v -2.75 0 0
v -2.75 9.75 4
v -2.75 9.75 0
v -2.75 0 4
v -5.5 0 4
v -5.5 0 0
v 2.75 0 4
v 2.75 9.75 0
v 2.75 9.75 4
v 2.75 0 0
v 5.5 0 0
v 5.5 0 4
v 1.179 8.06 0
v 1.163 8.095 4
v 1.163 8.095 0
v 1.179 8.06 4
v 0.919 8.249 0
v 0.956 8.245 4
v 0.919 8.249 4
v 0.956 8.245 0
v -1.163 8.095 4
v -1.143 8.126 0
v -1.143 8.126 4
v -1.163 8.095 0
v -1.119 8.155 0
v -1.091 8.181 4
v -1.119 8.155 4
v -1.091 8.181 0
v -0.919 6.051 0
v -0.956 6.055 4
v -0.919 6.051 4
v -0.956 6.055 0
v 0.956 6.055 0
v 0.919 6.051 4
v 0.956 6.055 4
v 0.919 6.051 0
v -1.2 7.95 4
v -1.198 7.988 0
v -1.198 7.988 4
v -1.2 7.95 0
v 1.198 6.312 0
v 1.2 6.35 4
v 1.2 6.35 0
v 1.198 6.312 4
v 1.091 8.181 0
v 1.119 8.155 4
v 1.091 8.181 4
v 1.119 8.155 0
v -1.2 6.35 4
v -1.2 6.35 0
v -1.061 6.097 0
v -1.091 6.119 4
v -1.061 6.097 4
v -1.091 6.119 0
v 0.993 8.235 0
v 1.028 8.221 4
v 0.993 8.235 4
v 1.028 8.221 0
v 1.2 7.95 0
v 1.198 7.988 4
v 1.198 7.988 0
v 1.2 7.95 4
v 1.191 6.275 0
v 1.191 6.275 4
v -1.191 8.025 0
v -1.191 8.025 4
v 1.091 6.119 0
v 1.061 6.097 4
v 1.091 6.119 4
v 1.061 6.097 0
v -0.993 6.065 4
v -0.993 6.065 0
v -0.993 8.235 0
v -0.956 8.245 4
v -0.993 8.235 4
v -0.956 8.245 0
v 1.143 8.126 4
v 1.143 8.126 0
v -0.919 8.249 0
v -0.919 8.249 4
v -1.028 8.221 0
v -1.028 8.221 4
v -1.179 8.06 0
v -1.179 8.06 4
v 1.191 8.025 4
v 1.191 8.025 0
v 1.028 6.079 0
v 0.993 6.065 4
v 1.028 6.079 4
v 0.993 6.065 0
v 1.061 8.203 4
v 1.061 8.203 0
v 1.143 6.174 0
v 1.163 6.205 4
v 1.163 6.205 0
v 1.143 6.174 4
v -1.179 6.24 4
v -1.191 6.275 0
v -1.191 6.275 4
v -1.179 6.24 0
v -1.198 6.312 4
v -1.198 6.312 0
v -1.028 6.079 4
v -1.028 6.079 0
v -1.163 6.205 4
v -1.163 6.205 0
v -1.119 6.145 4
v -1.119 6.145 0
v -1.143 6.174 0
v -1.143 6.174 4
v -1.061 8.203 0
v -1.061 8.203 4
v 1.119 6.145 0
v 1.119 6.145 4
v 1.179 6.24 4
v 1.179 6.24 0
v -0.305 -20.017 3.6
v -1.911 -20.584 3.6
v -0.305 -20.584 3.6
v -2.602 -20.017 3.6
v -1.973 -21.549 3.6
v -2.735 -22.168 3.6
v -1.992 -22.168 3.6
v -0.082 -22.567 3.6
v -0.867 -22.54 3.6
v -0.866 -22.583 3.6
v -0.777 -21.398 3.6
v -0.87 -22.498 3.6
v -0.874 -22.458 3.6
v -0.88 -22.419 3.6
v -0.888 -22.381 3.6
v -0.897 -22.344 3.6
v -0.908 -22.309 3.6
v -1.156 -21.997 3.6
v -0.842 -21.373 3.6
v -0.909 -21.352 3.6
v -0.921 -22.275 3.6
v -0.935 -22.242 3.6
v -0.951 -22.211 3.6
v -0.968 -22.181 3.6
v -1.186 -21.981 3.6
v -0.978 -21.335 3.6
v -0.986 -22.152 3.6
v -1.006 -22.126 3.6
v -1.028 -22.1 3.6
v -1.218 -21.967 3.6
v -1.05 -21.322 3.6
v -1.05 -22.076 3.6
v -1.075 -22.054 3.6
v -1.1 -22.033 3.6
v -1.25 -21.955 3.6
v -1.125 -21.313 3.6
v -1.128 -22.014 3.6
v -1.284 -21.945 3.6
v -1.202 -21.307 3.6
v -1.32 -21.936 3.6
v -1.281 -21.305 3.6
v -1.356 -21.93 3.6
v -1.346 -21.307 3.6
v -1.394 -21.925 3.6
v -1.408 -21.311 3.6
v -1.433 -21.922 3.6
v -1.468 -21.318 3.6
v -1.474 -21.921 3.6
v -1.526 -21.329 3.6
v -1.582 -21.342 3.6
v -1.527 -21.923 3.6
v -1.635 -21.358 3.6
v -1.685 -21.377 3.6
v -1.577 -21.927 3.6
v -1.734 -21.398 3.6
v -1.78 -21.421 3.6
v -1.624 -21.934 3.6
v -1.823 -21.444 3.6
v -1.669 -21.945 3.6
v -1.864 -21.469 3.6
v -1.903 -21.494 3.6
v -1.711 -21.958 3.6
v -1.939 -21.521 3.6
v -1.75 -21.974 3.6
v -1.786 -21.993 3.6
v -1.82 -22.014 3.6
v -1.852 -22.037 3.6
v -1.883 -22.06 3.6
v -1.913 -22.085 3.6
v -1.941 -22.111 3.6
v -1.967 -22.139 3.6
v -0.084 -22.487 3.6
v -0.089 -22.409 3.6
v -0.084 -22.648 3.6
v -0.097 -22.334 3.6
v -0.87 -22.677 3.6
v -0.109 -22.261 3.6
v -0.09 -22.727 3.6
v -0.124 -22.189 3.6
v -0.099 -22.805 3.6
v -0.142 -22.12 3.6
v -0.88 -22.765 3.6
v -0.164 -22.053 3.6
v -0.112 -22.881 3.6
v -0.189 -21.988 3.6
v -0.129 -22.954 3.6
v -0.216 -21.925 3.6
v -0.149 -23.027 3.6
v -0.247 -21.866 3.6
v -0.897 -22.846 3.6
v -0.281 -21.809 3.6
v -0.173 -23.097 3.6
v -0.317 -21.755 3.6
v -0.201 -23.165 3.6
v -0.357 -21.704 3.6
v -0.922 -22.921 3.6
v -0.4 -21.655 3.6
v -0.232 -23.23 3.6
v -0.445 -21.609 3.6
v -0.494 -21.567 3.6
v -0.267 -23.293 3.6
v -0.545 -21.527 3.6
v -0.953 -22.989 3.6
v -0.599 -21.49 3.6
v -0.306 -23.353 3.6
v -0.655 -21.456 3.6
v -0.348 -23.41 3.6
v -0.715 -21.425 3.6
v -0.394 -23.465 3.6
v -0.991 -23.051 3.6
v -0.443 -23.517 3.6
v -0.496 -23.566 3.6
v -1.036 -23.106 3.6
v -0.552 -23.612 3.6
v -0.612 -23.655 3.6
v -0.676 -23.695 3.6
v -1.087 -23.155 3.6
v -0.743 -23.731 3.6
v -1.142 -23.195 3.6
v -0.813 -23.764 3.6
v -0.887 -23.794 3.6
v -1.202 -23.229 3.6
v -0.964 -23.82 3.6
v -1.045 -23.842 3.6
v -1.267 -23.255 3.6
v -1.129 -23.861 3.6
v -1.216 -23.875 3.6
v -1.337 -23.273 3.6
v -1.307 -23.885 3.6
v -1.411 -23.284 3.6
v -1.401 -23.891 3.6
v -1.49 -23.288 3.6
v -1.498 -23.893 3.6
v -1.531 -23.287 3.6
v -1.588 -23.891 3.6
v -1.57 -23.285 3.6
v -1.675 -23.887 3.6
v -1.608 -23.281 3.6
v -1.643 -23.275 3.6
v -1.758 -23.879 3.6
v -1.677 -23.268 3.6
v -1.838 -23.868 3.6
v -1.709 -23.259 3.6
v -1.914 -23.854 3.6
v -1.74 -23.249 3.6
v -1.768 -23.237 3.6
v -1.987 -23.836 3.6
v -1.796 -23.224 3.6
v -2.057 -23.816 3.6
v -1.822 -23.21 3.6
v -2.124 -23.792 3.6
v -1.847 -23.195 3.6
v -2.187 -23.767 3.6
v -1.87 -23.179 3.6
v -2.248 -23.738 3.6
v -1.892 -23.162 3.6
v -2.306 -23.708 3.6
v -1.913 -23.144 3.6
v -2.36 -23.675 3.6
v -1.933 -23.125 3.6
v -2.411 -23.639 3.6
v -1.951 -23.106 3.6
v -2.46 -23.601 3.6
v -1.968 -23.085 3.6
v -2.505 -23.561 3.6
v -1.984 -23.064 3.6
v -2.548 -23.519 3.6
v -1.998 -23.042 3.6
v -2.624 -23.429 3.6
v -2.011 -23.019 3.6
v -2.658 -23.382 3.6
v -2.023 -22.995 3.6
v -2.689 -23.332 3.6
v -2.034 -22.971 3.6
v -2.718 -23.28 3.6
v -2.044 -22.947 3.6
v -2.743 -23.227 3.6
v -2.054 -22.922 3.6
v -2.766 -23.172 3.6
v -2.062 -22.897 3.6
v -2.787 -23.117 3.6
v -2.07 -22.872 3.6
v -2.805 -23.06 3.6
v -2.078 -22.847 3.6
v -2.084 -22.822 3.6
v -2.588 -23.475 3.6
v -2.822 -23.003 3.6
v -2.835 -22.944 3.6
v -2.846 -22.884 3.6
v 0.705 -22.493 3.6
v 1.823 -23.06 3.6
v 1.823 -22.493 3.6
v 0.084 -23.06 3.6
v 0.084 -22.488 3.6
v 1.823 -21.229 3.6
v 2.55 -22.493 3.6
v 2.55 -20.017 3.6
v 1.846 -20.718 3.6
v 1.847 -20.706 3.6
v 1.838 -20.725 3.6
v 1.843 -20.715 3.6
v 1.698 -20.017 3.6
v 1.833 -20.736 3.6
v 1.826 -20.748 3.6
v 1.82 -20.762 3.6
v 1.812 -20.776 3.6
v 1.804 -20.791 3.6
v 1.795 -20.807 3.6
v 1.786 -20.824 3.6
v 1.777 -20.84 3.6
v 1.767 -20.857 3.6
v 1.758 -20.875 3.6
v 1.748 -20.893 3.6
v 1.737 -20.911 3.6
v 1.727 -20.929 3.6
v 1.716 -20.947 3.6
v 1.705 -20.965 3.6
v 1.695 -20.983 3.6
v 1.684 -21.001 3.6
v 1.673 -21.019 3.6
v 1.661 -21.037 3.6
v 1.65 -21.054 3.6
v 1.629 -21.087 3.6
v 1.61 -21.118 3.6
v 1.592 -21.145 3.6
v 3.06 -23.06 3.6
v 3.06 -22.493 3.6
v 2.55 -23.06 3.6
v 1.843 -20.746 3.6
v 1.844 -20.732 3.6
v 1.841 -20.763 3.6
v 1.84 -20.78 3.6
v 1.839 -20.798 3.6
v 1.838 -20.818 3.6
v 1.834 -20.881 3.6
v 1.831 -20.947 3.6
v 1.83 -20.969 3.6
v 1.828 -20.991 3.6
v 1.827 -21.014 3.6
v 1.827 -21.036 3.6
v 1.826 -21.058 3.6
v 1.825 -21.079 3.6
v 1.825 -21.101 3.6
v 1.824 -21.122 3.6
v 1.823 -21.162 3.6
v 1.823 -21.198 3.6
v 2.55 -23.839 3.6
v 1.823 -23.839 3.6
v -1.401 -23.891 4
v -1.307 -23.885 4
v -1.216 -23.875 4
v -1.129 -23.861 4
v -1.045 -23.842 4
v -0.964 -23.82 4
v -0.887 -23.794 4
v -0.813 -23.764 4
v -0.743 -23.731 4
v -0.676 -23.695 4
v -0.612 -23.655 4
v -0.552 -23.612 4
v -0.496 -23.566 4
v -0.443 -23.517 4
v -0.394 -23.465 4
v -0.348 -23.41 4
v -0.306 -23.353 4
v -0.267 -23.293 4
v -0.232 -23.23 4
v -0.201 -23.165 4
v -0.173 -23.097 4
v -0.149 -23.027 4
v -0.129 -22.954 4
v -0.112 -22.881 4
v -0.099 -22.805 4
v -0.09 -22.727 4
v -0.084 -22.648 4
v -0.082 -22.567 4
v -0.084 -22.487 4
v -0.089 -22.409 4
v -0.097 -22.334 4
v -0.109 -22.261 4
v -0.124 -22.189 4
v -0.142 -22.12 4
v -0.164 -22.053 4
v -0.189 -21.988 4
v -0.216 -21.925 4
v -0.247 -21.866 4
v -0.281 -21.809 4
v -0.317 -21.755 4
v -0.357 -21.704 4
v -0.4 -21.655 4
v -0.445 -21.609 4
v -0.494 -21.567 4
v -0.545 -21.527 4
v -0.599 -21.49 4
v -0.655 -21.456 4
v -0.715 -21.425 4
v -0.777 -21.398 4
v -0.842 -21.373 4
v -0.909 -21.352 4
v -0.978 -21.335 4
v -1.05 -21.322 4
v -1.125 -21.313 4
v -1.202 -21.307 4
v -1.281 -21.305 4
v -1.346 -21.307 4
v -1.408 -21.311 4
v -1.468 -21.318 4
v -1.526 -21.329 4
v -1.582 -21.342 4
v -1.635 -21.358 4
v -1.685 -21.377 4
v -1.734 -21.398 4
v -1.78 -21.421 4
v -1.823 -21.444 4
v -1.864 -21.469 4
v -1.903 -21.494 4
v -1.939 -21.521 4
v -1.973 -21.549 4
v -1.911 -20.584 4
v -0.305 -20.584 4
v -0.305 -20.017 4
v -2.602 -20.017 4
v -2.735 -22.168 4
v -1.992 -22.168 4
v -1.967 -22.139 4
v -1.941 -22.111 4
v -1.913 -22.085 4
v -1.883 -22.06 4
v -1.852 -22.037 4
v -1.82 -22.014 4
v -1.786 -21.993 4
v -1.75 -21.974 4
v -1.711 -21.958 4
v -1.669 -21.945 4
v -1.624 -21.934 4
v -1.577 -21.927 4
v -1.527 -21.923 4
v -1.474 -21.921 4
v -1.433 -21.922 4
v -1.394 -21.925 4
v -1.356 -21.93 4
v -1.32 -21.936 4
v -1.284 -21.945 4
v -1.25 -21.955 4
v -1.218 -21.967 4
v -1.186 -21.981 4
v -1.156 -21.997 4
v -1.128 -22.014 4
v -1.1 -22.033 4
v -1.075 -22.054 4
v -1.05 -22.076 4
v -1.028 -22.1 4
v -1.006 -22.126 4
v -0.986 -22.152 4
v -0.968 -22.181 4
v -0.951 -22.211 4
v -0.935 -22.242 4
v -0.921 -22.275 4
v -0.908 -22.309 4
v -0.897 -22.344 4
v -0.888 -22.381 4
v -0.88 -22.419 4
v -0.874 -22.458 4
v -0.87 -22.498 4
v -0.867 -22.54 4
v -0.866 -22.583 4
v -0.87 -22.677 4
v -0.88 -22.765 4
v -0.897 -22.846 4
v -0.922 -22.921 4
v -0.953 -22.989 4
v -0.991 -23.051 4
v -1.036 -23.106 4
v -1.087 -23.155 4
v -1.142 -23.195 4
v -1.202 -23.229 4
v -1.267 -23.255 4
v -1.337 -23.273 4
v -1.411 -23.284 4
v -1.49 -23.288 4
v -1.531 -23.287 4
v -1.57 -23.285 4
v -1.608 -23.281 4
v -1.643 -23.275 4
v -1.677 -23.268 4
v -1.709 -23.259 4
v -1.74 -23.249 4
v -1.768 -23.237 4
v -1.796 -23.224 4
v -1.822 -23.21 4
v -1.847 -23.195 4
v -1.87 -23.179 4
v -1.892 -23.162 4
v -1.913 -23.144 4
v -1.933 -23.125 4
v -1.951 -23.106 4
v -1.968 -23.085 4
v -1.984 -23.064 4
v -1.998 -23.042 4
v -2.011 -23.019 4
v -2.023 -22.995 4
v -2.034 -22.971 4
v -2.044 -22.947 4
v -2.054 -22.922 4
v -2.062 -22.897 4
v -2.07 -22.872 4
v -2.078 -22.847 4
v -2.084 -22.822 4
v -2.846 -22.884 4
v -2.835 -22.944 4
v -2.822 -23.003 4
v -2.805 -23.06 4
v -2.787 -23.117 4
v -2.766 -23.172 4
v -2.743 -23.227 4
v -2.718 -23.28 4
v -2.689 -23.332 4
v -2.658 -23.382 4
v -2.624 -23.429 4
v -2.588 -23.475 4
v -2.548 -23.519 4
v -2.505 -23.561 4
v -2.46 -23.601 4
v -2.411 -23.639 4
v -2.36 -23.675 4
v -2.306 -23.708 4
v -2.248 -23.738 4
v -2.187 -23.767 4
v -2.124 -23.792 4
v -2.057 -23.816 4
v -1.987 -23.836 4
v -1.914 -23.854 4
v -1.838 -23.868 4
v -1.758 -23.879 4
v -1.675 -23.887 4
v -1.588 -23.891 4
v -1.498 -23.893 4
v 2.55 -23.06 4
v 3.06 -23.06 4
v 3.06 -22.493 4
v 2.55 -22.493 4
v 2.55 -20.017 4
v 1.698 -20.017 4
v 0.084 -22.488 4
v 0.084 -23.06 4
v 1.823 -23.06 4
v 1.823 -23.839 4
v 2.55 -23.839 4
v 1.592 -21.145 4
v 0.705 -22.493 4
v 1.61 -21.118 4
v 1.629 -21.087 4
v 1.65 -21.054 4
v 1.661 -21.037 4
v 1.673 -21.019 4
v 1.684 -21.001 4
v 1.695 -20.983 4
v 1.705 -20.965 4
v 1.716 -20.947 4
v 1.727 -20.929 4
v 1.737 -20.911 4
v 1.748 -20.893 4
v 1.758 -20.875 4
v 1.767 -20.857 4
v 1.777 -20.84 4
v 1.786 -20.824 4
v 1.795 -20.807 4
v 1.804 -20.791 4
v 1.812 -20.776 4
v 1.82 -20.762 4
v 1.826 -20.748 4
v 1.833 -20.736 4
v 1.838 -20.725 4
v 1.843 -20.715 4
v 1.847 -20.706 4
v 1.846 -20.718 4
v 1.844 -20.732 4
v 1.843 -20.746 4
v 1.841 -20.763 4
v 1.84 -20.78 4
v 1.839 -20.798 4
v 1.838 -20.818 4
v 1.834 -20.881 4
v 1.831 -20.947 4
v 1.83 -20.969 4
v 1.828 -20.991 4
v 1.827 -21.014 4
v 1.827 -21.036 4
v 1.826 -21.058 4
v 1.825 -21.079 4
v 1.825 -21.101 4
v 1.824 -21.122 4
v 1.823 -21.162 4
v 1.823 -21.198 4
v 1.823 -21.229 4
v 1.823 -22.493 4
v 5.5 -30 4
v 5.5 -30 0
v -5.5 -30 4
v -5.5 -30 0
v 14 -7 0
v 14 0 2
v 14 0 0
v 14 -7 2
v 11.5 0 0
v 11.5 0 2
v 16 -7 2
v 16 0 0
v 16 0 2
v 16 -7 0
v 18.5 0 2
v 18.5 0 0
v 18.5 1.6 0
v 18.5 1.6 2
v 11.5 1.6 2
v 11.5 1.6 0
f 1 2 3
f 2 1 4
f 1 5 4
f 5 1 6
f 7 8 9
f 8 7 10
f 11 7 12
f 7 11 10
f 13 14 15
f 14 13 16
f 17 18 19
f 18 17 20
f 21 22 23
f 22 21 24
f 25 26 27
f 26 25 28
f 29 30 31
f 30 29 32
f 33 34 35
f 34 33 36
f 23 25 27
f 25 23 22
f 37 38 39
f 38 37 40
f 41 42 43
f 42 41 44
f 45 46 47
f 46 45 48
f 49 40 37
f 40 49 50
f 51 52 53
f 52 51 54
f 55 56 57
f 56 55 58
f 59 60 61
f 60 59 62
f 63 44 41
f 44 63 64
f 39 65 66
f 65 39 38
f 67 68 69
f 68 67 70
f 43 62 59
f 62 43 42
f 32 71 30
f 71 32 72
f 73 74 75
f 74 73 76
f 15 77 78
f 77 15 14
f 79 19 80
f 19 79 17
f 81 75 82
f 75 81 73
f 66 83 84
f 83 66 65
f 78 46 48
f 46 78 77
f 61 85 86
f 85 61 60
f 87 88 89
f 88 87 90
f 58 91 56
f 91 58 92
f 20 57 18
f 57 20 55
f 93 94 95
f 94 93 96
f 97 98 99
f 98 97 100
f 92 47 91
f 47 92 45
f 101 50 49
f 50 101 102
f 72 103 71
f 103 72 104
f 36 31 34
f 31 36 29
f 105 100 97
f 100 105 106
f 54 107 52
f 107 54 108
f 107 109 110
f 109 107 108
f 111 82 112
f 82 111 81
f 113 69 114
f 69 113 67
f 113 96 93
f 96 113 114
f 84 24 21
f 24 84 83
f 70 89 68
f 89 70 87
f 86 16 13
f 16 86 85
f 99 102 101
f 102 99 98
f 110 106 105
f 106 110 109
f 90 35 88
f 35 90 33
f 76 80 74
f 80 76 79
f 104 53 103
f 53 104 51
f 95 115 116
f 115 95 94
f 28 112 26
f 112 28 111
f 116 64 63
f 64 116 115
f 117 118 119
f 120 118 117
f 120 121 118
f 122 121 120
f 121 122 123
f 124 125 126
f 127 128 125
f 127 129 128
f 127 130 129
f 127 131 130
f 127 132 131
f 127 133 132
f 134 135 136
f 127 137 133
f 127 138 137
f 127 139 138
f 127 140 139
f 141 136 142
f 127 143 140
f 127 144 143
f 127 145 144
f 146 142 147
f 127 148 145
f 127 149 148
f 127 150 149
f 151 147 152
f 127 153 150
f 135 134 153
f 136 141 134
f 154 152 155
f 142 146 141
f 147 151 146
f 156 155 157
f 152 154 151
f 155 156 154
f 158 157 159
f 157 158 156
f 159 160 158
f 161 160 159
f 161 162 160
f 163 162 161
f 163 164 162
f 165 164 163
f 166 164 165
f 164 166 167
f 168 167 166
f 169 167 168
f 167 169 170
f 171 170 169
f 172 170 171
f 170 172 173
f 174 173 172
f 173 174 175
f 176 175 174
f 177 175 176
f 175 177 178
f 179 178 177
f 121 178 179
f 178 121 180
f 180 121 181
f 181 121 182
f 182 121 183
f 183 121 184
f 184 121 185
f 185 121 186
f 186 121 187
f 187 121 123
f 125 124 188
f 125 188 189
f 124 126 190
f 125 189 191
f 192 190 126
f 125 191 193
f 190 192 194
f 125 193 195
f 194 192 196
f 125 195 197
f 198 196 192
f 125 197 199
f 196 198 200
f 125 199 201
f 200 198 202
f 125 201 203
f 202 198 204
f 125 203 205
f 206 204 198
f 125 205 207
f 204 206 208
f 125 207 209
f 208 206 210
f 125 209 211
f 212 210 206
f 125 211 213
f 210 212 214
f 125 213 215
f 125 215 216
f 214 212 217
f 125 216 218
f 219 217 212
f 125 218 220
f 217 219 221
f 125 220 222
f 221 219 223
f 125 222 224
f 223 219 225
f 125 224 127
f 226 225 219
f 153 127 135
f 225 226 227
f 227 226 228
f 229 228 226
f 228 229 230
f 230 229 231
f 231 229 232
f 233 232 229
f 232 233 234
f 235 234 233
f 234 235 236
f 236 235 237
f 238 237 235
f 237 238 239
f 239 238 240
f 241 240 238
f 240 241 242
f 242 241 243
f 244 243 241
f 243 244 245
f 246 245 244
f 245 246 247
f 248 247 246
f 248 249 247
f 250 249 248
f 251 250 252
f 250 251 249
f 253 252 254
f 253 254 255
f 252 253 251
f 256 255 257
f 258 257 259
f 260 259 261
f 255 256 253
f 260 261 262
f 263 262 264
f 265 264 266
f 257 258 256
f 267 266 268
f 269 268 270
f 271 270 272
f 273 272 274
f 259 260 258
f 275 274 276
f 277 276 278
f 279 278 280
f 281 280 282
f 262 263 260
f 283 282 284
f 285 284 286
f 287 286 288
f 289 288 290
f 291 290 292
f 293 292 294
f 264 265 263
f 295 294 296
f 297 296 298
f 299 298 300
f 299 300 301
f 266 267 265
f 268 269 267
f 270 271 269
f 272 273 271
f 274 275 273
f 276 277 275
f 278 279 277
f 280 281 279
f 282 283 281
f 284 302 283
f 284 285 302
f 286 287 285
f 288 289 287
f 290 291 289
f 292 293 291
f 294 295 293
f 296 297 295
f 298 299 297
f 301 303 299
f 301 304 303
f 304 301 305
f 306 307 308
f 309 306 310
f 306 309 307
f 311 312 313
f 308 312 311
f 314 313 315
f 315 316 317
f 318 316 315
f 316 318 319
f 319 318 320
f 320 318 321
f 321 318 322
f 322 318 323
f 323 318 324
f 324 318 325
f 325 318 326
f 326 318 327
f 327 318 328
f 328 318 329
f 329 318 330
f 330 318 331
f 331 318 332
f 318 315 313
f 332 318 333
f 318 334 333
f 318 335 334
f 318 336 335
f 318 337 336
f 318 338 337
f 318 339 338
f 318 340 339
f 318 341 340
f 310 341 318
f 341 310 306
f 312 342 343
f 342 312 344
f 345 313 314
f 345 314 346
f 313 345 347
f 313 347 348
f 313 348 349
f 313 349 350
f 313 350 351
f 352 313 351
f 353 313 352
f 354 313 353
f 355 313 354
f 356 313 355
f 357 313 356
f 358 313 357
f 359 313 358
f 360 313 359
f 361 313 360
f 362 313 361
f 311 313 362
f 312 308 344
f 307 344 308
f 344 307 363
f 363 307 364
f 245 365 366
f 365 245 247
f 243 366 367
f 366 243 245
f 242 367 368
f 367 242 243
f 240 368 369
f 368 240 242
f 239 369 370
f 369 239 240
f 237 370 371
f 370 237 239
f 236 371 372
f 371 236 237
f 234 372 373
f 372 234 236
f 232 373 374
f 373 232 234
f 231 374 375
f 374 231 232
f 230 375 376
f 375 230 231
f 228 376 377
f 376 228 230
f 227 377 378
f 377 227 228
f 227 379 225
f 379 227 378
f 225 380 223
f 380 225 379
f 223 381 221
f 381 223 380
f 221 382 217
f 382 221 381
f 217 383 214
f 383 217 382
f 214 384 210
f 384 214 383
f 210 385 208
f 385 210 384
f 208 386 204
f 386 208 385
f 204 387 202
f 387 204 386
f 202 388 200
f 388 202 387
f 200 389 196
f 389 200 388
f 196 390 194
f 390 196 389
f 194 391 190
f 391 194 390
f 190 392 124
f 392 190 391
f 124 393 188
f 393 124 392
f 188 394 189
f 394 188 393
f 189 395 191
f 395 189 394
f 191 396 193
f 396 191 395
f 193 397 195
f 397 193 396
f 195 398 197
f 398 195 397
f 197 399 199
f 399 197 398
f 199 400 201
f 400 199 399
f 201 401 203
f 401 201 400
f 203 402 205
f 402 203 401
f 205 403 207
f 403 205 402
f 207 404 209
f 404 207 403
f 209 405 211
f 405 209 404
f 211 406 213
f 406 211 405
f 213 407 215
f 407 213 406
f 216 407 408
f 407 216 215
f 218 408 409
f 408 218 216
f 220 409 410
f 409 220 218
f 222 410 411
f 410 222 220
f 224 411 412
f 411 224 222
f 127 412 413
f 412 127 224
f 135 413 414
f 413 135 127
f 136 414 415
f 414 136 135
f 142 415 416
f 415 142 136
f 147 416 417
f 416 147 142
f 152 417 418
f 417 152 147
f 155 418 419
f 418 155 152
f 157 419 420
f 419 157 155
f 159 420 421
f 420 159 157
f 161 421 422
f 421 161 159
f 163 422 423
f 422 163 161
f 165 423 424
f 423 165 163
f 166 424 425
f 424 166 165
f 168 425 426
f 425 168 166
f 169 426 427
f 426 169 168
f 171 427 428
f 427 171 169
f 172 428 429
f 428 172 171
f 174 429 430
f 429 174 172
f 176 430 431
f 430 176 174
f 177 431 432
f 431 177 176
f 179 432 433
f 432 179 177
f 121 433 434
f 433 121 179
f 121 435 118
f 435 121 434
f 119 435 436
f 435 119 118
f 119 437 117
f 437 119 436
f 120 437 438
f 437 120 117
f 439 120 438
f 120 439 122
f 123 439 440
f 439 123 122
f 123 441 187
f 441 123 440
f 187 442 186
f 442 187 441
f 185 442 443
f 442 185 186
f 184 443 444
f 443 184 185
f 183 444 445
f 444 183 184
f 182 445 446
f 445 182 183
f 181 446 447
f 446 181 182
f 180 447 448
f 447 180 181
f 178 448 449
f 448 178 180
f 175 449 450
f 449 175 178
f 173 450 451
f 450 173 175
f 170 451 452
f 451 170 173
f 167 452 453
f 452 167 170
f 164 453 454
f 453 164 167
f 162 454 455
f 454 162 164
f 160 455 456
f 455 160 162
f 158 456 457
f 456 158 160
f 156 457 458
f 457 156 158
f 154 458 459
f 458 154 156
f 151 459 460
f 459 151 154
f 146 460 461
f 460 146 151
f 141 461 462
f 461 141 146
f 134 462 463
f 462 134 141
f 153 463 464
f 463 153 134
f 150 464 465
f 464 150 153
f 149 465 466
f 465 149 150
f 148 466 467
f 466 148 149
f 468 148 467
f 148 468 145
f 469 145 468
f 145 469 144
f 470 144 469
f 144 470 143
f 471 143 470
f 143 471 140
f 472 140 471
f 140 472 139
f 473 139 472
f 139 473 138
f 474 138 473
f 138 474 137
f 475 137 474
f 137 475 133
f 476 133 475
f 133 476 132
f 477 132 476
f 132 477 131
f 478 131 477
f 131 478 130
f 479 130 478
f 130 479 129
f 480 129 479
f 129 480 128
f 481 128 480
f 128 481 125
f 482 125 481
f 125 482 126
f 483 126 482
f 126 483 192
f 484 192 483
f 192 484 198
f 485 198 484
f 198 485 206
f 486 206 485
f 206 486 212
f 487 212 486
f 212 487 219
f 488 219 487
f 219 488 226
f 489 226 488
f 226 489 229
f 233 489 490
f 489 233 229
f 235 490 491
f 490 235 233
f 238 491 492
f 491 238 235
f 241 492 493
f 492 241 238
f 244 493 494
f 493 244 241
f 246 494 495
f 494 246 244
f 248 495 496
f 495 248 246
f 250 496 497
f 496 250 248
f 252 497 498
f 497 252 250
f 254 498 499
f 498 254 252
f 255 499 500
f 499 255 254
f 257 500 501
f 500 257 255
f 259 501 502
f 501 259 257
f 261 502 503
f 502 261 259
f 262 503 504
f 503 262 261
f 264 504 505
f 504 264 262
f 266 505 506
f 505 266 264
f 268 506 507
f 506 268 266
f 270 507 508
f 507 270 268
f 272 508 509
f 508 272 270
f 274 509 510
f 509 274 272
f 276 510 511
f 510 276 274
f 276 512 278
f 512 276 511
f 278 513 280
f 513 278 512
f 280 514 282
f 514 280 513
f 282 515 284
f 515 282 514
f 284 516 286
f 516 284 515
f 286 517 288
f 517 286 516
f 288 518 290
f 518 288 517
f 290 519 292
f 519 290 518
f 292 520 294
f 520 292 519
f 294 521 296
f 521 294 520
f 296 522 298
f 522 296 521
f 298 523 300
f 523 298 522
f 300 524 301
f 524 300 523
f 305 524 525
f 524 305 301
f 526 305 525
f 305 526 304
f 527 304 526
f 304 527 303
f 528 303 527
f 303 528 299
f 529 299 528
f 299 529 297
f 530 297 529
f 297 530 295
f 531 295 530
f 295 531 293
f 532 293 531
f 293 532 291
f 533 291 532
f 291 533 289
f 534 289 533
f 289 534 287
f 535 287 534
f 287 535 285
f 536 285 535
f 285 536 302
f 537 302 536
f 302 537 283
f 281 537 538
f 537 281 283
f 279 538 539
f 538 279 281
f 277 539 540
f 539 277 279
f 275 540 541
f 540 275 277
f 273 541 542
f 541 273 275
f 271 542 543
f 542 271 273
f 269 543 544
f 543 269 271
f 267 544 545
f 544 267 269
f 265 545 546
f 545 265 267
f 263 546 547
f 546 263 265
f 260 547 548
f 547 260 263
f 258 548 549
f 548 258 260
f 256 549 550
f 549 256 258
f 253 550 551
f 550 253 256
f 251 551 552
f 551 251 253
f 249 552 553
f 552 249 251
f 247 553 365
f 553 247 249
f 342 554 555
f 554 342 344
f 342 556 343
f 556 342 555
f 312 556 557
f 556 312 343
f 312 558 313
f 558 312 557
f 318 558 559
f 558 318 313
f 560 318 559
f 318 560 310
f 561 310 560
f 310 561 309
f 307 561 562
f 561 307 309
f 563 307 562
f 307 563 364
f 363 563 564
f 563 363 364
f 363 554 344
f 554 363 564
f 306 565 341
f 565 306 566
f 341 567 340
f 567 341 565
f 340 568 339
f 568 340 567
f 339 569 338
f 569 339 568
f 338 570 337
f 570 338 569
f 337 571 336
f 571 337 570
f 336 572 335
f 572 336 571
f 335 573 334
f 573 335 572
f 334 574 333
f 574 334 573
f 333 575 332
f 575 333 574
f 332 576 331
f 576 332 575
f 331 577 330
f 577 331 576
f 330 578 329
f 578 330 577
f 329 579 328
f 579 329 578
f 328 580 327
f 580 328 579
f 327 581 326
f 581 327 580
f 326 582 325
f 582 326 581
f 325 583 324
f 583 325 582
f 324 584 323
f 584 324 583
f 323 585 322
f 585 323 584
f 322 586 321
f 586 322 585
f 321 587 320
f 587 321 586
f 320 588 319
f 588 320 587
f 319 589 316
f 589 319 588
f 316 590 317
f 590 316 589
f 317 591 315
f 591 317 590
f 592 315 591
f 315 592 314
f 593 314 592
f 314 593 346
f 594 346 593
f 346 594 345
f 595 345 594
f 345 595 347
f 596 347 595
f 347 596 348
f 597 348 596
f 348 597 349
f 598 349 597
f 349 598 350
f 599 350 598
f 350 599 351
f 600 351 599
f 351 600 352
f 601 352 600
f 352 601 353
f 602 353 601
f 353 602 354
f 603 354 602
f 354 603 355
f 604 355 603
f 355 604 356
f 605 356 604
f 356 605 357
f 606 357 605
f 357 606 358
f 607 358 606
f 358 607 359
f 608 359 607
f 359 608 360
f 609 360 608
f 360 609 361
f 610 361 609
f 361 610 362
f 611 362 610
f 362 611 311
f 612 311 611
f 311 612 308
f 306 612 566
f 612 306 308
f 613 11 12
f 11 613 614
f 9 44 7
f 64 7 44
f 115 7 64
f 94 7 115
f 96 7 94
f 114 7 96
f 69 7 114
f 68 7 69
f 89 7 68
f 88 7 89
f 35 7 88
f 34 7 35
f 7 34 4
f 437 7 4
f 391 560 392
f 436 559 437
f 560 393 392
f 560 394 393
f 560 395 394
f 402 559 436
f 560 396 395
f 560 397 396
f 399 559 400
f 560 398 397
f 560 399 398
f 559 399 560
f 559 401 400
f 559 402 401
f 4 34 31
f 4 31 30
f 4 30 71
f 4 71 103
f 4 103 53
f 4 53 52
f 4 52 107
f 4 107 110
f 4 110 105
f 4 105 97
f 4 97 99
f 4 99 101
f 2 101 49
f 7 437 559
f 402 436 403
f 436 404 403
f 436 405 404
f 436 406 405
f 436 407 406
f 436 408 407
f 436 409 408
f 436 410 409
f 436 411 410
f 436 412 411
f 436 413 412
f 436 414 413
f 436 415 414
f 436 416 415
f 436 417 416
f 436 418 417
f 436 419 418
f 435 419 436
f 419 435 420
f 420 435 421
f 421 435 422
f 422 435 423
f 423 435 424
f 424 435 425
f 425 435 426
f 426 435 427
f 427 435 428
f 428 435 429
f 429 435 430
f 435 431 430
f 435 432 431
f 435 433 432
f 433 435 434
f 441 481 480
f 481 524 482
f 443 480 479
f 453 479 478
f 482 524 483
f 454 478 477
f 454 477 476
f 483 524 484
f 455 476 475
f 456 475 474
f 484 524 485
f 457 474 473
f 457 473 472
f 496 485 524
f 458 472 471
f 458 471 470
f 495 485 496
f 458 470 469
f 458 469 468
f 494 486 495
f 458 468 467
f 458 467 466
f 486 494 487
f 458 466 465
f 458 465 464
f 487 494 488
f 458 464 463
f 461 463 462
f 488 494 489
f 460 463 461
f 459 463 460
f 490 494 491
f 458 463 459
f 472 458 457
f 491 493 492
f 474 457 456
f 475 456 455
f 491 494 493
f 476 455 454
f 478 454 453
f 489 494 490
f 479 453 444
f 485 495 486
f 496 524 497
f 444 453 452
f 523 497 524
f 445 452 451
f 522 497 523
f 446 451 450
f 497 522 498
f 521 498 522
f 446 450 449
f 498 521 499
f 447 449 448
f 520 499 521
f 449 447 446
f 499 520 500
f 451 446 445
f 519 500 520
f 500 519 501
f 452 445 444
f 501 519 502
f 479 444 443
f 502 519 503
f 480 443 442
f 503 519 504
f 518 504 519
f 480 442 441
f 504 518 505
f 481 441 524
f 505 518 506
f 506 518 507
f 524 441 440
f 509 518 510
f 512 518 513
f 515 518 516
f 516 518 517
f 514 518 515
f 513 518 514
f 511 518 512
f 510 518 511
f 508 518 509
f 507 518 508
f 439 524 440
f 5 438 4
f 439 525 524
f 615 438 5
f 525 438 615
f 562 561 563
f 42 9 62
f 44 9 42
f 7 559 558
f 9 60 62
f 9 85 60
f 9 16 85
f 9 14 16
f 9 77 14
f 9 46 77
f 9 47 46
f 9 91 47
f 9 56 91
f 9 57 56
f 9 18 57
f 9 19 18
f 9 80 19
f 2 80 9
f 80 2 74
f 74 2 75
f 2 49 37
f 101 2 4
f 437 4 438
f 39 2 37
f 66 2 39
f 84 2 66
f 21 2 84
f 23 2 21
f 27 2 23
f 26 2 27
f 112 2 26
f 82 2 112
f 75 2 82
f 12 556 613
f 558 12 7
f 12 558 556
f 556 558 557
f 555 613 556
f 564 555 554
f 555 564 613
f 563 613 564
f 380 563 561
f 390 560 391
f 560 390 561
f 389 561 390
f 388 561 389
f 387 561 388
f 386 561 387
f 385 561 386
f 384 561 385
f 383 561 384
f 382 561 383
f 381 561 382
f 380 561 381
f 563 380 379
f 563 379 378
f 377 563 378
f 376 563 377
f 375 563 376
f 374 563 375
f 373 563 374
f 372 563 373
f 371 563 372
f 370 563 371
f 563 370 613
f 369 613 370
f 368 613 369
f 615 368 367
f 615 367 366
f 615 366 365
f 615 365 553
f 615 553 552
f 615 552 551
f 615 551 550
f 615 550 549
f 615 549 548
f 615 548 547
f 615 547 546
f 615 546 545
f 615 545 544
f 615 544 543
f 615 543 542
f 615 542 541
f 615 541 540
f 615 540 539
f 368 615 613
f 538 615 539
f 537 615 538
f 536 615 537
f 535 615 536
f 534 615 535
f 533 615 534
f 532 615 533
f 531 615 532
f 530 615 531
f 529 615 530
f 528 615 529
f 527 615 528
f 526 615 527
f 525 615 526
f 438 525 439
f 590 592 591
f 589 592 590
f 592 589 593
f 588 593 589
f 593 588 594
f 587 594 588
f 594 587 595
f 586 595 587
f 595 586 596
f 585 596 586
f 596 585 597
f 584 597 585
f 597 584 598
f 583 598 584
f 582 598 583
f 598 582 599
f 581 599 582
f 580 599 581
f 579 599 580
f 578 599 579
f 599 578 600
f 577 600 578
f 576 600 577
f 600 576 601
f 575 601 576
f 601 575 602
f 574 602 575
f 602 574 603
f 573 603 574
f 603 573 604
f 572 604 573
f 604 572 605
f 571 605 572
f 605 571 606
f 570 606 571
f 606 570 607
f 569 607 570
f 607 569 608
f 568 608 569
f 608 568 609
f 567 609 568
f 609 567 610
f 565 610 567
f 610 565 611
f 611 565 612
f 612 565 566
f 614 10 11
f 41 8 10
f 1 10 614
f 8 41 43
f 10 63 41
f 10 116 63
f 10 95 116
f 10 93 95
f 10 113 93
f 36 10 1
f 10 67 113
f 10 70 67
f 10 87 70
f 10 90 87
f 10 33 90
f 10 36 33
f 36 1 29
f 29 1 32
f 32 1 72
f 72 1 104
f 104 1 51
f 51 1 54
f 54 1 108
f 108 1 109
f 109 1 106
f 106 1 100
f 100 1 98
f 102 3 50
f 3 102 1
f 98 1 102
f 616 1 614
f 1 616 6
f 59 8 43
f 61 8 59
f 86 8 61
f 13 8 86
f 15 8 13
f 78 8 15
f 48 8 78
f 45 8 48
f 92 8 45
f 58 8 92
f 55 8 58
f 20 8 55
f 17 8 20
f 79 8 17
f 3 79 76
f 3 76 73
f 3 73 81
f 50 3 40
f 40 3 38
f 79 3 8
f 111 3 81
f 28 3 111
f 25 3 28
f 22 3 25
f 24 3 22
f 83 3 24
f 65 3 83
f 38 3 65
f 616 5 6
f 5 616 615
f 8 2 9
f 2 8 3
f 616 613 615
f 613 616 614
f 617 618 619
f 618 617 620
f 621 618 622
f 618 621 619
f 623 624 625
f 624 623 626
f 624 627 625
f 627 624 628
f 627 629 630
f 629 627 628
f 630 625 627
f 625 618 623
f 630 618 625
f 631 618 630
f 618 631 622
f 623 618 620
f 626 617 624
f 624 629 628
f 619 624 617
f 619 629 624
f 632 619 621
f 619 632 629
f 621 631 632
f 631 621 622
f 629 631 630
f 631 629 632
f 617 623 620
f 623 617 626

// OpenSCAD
$fn = 50;

difference() {
	union() {
		translate(v = [0, 0, 0]) {
			rotate(a = [0, 0, 0]) {
				difference() {
					union() {
						translate(v = [-5.5, -30.0, 0]) {
							cube(size = [11.0, 39.75, 4.0]);
						}
					}
					union() {
						translate(v = [-5.6, 0, -0.1]) {
							cube(size = [2.85, 9.95, 4.2]);
						}
						translate(v = [2.75, 0, -0.1]) {
							cube(size = [2.85, 9.95, 4.2]);
						}
						translate(v = [0, 7.15, -0.1]) {
							hull() {
								translate(v = [-0.8999999999999999, 0.8, 0]) {
									cylinder(h = 4.2, r = 0.3);
								}
								translate(v = [0.8999999999999999, 0.8, 0]) {
									cylinder(h = 4.2, r = 0.3);
								}
								translate(v = [-0.8999999999999999, -0.8, 0]) {
									cylinder(h = 4.2, r = 0.3);
								}
								translate(v = [0.8999999999999999, -0.8, 0]) {
									cylinder(h = 4.2, r = 0.3);
								}
							}
						}
						translate(v = [0, -22, 3.6]) {
							linear_extrude(height = 0.5) {
								text(font = "Arial:style=Bold", halign = "center", size = 4.0, text = "54", valign = "center");
							}
						}
					}
				}
			}
		}
		translate(v = [15, 0, 0]) {
			rotate(a = [0, 0, 0]) {
				difference() {
					union() {
						translate(v = [-3.5, -7.0, 0]) {
							cube(size = [7.0, 8.6, 2.0]);
						}
					}
					union() {
						translate(v = [-3.6, -7.1, -0.1]) {
							cube(size = [2.6, 7.1, 2.2]);
						}
						translate(v = [1.0, -7.1, -0.1]) {
							cube(size = [2.6, 7.1, 2.2]);
						}
					}
				}
			}
		}
	}
	union();
}
